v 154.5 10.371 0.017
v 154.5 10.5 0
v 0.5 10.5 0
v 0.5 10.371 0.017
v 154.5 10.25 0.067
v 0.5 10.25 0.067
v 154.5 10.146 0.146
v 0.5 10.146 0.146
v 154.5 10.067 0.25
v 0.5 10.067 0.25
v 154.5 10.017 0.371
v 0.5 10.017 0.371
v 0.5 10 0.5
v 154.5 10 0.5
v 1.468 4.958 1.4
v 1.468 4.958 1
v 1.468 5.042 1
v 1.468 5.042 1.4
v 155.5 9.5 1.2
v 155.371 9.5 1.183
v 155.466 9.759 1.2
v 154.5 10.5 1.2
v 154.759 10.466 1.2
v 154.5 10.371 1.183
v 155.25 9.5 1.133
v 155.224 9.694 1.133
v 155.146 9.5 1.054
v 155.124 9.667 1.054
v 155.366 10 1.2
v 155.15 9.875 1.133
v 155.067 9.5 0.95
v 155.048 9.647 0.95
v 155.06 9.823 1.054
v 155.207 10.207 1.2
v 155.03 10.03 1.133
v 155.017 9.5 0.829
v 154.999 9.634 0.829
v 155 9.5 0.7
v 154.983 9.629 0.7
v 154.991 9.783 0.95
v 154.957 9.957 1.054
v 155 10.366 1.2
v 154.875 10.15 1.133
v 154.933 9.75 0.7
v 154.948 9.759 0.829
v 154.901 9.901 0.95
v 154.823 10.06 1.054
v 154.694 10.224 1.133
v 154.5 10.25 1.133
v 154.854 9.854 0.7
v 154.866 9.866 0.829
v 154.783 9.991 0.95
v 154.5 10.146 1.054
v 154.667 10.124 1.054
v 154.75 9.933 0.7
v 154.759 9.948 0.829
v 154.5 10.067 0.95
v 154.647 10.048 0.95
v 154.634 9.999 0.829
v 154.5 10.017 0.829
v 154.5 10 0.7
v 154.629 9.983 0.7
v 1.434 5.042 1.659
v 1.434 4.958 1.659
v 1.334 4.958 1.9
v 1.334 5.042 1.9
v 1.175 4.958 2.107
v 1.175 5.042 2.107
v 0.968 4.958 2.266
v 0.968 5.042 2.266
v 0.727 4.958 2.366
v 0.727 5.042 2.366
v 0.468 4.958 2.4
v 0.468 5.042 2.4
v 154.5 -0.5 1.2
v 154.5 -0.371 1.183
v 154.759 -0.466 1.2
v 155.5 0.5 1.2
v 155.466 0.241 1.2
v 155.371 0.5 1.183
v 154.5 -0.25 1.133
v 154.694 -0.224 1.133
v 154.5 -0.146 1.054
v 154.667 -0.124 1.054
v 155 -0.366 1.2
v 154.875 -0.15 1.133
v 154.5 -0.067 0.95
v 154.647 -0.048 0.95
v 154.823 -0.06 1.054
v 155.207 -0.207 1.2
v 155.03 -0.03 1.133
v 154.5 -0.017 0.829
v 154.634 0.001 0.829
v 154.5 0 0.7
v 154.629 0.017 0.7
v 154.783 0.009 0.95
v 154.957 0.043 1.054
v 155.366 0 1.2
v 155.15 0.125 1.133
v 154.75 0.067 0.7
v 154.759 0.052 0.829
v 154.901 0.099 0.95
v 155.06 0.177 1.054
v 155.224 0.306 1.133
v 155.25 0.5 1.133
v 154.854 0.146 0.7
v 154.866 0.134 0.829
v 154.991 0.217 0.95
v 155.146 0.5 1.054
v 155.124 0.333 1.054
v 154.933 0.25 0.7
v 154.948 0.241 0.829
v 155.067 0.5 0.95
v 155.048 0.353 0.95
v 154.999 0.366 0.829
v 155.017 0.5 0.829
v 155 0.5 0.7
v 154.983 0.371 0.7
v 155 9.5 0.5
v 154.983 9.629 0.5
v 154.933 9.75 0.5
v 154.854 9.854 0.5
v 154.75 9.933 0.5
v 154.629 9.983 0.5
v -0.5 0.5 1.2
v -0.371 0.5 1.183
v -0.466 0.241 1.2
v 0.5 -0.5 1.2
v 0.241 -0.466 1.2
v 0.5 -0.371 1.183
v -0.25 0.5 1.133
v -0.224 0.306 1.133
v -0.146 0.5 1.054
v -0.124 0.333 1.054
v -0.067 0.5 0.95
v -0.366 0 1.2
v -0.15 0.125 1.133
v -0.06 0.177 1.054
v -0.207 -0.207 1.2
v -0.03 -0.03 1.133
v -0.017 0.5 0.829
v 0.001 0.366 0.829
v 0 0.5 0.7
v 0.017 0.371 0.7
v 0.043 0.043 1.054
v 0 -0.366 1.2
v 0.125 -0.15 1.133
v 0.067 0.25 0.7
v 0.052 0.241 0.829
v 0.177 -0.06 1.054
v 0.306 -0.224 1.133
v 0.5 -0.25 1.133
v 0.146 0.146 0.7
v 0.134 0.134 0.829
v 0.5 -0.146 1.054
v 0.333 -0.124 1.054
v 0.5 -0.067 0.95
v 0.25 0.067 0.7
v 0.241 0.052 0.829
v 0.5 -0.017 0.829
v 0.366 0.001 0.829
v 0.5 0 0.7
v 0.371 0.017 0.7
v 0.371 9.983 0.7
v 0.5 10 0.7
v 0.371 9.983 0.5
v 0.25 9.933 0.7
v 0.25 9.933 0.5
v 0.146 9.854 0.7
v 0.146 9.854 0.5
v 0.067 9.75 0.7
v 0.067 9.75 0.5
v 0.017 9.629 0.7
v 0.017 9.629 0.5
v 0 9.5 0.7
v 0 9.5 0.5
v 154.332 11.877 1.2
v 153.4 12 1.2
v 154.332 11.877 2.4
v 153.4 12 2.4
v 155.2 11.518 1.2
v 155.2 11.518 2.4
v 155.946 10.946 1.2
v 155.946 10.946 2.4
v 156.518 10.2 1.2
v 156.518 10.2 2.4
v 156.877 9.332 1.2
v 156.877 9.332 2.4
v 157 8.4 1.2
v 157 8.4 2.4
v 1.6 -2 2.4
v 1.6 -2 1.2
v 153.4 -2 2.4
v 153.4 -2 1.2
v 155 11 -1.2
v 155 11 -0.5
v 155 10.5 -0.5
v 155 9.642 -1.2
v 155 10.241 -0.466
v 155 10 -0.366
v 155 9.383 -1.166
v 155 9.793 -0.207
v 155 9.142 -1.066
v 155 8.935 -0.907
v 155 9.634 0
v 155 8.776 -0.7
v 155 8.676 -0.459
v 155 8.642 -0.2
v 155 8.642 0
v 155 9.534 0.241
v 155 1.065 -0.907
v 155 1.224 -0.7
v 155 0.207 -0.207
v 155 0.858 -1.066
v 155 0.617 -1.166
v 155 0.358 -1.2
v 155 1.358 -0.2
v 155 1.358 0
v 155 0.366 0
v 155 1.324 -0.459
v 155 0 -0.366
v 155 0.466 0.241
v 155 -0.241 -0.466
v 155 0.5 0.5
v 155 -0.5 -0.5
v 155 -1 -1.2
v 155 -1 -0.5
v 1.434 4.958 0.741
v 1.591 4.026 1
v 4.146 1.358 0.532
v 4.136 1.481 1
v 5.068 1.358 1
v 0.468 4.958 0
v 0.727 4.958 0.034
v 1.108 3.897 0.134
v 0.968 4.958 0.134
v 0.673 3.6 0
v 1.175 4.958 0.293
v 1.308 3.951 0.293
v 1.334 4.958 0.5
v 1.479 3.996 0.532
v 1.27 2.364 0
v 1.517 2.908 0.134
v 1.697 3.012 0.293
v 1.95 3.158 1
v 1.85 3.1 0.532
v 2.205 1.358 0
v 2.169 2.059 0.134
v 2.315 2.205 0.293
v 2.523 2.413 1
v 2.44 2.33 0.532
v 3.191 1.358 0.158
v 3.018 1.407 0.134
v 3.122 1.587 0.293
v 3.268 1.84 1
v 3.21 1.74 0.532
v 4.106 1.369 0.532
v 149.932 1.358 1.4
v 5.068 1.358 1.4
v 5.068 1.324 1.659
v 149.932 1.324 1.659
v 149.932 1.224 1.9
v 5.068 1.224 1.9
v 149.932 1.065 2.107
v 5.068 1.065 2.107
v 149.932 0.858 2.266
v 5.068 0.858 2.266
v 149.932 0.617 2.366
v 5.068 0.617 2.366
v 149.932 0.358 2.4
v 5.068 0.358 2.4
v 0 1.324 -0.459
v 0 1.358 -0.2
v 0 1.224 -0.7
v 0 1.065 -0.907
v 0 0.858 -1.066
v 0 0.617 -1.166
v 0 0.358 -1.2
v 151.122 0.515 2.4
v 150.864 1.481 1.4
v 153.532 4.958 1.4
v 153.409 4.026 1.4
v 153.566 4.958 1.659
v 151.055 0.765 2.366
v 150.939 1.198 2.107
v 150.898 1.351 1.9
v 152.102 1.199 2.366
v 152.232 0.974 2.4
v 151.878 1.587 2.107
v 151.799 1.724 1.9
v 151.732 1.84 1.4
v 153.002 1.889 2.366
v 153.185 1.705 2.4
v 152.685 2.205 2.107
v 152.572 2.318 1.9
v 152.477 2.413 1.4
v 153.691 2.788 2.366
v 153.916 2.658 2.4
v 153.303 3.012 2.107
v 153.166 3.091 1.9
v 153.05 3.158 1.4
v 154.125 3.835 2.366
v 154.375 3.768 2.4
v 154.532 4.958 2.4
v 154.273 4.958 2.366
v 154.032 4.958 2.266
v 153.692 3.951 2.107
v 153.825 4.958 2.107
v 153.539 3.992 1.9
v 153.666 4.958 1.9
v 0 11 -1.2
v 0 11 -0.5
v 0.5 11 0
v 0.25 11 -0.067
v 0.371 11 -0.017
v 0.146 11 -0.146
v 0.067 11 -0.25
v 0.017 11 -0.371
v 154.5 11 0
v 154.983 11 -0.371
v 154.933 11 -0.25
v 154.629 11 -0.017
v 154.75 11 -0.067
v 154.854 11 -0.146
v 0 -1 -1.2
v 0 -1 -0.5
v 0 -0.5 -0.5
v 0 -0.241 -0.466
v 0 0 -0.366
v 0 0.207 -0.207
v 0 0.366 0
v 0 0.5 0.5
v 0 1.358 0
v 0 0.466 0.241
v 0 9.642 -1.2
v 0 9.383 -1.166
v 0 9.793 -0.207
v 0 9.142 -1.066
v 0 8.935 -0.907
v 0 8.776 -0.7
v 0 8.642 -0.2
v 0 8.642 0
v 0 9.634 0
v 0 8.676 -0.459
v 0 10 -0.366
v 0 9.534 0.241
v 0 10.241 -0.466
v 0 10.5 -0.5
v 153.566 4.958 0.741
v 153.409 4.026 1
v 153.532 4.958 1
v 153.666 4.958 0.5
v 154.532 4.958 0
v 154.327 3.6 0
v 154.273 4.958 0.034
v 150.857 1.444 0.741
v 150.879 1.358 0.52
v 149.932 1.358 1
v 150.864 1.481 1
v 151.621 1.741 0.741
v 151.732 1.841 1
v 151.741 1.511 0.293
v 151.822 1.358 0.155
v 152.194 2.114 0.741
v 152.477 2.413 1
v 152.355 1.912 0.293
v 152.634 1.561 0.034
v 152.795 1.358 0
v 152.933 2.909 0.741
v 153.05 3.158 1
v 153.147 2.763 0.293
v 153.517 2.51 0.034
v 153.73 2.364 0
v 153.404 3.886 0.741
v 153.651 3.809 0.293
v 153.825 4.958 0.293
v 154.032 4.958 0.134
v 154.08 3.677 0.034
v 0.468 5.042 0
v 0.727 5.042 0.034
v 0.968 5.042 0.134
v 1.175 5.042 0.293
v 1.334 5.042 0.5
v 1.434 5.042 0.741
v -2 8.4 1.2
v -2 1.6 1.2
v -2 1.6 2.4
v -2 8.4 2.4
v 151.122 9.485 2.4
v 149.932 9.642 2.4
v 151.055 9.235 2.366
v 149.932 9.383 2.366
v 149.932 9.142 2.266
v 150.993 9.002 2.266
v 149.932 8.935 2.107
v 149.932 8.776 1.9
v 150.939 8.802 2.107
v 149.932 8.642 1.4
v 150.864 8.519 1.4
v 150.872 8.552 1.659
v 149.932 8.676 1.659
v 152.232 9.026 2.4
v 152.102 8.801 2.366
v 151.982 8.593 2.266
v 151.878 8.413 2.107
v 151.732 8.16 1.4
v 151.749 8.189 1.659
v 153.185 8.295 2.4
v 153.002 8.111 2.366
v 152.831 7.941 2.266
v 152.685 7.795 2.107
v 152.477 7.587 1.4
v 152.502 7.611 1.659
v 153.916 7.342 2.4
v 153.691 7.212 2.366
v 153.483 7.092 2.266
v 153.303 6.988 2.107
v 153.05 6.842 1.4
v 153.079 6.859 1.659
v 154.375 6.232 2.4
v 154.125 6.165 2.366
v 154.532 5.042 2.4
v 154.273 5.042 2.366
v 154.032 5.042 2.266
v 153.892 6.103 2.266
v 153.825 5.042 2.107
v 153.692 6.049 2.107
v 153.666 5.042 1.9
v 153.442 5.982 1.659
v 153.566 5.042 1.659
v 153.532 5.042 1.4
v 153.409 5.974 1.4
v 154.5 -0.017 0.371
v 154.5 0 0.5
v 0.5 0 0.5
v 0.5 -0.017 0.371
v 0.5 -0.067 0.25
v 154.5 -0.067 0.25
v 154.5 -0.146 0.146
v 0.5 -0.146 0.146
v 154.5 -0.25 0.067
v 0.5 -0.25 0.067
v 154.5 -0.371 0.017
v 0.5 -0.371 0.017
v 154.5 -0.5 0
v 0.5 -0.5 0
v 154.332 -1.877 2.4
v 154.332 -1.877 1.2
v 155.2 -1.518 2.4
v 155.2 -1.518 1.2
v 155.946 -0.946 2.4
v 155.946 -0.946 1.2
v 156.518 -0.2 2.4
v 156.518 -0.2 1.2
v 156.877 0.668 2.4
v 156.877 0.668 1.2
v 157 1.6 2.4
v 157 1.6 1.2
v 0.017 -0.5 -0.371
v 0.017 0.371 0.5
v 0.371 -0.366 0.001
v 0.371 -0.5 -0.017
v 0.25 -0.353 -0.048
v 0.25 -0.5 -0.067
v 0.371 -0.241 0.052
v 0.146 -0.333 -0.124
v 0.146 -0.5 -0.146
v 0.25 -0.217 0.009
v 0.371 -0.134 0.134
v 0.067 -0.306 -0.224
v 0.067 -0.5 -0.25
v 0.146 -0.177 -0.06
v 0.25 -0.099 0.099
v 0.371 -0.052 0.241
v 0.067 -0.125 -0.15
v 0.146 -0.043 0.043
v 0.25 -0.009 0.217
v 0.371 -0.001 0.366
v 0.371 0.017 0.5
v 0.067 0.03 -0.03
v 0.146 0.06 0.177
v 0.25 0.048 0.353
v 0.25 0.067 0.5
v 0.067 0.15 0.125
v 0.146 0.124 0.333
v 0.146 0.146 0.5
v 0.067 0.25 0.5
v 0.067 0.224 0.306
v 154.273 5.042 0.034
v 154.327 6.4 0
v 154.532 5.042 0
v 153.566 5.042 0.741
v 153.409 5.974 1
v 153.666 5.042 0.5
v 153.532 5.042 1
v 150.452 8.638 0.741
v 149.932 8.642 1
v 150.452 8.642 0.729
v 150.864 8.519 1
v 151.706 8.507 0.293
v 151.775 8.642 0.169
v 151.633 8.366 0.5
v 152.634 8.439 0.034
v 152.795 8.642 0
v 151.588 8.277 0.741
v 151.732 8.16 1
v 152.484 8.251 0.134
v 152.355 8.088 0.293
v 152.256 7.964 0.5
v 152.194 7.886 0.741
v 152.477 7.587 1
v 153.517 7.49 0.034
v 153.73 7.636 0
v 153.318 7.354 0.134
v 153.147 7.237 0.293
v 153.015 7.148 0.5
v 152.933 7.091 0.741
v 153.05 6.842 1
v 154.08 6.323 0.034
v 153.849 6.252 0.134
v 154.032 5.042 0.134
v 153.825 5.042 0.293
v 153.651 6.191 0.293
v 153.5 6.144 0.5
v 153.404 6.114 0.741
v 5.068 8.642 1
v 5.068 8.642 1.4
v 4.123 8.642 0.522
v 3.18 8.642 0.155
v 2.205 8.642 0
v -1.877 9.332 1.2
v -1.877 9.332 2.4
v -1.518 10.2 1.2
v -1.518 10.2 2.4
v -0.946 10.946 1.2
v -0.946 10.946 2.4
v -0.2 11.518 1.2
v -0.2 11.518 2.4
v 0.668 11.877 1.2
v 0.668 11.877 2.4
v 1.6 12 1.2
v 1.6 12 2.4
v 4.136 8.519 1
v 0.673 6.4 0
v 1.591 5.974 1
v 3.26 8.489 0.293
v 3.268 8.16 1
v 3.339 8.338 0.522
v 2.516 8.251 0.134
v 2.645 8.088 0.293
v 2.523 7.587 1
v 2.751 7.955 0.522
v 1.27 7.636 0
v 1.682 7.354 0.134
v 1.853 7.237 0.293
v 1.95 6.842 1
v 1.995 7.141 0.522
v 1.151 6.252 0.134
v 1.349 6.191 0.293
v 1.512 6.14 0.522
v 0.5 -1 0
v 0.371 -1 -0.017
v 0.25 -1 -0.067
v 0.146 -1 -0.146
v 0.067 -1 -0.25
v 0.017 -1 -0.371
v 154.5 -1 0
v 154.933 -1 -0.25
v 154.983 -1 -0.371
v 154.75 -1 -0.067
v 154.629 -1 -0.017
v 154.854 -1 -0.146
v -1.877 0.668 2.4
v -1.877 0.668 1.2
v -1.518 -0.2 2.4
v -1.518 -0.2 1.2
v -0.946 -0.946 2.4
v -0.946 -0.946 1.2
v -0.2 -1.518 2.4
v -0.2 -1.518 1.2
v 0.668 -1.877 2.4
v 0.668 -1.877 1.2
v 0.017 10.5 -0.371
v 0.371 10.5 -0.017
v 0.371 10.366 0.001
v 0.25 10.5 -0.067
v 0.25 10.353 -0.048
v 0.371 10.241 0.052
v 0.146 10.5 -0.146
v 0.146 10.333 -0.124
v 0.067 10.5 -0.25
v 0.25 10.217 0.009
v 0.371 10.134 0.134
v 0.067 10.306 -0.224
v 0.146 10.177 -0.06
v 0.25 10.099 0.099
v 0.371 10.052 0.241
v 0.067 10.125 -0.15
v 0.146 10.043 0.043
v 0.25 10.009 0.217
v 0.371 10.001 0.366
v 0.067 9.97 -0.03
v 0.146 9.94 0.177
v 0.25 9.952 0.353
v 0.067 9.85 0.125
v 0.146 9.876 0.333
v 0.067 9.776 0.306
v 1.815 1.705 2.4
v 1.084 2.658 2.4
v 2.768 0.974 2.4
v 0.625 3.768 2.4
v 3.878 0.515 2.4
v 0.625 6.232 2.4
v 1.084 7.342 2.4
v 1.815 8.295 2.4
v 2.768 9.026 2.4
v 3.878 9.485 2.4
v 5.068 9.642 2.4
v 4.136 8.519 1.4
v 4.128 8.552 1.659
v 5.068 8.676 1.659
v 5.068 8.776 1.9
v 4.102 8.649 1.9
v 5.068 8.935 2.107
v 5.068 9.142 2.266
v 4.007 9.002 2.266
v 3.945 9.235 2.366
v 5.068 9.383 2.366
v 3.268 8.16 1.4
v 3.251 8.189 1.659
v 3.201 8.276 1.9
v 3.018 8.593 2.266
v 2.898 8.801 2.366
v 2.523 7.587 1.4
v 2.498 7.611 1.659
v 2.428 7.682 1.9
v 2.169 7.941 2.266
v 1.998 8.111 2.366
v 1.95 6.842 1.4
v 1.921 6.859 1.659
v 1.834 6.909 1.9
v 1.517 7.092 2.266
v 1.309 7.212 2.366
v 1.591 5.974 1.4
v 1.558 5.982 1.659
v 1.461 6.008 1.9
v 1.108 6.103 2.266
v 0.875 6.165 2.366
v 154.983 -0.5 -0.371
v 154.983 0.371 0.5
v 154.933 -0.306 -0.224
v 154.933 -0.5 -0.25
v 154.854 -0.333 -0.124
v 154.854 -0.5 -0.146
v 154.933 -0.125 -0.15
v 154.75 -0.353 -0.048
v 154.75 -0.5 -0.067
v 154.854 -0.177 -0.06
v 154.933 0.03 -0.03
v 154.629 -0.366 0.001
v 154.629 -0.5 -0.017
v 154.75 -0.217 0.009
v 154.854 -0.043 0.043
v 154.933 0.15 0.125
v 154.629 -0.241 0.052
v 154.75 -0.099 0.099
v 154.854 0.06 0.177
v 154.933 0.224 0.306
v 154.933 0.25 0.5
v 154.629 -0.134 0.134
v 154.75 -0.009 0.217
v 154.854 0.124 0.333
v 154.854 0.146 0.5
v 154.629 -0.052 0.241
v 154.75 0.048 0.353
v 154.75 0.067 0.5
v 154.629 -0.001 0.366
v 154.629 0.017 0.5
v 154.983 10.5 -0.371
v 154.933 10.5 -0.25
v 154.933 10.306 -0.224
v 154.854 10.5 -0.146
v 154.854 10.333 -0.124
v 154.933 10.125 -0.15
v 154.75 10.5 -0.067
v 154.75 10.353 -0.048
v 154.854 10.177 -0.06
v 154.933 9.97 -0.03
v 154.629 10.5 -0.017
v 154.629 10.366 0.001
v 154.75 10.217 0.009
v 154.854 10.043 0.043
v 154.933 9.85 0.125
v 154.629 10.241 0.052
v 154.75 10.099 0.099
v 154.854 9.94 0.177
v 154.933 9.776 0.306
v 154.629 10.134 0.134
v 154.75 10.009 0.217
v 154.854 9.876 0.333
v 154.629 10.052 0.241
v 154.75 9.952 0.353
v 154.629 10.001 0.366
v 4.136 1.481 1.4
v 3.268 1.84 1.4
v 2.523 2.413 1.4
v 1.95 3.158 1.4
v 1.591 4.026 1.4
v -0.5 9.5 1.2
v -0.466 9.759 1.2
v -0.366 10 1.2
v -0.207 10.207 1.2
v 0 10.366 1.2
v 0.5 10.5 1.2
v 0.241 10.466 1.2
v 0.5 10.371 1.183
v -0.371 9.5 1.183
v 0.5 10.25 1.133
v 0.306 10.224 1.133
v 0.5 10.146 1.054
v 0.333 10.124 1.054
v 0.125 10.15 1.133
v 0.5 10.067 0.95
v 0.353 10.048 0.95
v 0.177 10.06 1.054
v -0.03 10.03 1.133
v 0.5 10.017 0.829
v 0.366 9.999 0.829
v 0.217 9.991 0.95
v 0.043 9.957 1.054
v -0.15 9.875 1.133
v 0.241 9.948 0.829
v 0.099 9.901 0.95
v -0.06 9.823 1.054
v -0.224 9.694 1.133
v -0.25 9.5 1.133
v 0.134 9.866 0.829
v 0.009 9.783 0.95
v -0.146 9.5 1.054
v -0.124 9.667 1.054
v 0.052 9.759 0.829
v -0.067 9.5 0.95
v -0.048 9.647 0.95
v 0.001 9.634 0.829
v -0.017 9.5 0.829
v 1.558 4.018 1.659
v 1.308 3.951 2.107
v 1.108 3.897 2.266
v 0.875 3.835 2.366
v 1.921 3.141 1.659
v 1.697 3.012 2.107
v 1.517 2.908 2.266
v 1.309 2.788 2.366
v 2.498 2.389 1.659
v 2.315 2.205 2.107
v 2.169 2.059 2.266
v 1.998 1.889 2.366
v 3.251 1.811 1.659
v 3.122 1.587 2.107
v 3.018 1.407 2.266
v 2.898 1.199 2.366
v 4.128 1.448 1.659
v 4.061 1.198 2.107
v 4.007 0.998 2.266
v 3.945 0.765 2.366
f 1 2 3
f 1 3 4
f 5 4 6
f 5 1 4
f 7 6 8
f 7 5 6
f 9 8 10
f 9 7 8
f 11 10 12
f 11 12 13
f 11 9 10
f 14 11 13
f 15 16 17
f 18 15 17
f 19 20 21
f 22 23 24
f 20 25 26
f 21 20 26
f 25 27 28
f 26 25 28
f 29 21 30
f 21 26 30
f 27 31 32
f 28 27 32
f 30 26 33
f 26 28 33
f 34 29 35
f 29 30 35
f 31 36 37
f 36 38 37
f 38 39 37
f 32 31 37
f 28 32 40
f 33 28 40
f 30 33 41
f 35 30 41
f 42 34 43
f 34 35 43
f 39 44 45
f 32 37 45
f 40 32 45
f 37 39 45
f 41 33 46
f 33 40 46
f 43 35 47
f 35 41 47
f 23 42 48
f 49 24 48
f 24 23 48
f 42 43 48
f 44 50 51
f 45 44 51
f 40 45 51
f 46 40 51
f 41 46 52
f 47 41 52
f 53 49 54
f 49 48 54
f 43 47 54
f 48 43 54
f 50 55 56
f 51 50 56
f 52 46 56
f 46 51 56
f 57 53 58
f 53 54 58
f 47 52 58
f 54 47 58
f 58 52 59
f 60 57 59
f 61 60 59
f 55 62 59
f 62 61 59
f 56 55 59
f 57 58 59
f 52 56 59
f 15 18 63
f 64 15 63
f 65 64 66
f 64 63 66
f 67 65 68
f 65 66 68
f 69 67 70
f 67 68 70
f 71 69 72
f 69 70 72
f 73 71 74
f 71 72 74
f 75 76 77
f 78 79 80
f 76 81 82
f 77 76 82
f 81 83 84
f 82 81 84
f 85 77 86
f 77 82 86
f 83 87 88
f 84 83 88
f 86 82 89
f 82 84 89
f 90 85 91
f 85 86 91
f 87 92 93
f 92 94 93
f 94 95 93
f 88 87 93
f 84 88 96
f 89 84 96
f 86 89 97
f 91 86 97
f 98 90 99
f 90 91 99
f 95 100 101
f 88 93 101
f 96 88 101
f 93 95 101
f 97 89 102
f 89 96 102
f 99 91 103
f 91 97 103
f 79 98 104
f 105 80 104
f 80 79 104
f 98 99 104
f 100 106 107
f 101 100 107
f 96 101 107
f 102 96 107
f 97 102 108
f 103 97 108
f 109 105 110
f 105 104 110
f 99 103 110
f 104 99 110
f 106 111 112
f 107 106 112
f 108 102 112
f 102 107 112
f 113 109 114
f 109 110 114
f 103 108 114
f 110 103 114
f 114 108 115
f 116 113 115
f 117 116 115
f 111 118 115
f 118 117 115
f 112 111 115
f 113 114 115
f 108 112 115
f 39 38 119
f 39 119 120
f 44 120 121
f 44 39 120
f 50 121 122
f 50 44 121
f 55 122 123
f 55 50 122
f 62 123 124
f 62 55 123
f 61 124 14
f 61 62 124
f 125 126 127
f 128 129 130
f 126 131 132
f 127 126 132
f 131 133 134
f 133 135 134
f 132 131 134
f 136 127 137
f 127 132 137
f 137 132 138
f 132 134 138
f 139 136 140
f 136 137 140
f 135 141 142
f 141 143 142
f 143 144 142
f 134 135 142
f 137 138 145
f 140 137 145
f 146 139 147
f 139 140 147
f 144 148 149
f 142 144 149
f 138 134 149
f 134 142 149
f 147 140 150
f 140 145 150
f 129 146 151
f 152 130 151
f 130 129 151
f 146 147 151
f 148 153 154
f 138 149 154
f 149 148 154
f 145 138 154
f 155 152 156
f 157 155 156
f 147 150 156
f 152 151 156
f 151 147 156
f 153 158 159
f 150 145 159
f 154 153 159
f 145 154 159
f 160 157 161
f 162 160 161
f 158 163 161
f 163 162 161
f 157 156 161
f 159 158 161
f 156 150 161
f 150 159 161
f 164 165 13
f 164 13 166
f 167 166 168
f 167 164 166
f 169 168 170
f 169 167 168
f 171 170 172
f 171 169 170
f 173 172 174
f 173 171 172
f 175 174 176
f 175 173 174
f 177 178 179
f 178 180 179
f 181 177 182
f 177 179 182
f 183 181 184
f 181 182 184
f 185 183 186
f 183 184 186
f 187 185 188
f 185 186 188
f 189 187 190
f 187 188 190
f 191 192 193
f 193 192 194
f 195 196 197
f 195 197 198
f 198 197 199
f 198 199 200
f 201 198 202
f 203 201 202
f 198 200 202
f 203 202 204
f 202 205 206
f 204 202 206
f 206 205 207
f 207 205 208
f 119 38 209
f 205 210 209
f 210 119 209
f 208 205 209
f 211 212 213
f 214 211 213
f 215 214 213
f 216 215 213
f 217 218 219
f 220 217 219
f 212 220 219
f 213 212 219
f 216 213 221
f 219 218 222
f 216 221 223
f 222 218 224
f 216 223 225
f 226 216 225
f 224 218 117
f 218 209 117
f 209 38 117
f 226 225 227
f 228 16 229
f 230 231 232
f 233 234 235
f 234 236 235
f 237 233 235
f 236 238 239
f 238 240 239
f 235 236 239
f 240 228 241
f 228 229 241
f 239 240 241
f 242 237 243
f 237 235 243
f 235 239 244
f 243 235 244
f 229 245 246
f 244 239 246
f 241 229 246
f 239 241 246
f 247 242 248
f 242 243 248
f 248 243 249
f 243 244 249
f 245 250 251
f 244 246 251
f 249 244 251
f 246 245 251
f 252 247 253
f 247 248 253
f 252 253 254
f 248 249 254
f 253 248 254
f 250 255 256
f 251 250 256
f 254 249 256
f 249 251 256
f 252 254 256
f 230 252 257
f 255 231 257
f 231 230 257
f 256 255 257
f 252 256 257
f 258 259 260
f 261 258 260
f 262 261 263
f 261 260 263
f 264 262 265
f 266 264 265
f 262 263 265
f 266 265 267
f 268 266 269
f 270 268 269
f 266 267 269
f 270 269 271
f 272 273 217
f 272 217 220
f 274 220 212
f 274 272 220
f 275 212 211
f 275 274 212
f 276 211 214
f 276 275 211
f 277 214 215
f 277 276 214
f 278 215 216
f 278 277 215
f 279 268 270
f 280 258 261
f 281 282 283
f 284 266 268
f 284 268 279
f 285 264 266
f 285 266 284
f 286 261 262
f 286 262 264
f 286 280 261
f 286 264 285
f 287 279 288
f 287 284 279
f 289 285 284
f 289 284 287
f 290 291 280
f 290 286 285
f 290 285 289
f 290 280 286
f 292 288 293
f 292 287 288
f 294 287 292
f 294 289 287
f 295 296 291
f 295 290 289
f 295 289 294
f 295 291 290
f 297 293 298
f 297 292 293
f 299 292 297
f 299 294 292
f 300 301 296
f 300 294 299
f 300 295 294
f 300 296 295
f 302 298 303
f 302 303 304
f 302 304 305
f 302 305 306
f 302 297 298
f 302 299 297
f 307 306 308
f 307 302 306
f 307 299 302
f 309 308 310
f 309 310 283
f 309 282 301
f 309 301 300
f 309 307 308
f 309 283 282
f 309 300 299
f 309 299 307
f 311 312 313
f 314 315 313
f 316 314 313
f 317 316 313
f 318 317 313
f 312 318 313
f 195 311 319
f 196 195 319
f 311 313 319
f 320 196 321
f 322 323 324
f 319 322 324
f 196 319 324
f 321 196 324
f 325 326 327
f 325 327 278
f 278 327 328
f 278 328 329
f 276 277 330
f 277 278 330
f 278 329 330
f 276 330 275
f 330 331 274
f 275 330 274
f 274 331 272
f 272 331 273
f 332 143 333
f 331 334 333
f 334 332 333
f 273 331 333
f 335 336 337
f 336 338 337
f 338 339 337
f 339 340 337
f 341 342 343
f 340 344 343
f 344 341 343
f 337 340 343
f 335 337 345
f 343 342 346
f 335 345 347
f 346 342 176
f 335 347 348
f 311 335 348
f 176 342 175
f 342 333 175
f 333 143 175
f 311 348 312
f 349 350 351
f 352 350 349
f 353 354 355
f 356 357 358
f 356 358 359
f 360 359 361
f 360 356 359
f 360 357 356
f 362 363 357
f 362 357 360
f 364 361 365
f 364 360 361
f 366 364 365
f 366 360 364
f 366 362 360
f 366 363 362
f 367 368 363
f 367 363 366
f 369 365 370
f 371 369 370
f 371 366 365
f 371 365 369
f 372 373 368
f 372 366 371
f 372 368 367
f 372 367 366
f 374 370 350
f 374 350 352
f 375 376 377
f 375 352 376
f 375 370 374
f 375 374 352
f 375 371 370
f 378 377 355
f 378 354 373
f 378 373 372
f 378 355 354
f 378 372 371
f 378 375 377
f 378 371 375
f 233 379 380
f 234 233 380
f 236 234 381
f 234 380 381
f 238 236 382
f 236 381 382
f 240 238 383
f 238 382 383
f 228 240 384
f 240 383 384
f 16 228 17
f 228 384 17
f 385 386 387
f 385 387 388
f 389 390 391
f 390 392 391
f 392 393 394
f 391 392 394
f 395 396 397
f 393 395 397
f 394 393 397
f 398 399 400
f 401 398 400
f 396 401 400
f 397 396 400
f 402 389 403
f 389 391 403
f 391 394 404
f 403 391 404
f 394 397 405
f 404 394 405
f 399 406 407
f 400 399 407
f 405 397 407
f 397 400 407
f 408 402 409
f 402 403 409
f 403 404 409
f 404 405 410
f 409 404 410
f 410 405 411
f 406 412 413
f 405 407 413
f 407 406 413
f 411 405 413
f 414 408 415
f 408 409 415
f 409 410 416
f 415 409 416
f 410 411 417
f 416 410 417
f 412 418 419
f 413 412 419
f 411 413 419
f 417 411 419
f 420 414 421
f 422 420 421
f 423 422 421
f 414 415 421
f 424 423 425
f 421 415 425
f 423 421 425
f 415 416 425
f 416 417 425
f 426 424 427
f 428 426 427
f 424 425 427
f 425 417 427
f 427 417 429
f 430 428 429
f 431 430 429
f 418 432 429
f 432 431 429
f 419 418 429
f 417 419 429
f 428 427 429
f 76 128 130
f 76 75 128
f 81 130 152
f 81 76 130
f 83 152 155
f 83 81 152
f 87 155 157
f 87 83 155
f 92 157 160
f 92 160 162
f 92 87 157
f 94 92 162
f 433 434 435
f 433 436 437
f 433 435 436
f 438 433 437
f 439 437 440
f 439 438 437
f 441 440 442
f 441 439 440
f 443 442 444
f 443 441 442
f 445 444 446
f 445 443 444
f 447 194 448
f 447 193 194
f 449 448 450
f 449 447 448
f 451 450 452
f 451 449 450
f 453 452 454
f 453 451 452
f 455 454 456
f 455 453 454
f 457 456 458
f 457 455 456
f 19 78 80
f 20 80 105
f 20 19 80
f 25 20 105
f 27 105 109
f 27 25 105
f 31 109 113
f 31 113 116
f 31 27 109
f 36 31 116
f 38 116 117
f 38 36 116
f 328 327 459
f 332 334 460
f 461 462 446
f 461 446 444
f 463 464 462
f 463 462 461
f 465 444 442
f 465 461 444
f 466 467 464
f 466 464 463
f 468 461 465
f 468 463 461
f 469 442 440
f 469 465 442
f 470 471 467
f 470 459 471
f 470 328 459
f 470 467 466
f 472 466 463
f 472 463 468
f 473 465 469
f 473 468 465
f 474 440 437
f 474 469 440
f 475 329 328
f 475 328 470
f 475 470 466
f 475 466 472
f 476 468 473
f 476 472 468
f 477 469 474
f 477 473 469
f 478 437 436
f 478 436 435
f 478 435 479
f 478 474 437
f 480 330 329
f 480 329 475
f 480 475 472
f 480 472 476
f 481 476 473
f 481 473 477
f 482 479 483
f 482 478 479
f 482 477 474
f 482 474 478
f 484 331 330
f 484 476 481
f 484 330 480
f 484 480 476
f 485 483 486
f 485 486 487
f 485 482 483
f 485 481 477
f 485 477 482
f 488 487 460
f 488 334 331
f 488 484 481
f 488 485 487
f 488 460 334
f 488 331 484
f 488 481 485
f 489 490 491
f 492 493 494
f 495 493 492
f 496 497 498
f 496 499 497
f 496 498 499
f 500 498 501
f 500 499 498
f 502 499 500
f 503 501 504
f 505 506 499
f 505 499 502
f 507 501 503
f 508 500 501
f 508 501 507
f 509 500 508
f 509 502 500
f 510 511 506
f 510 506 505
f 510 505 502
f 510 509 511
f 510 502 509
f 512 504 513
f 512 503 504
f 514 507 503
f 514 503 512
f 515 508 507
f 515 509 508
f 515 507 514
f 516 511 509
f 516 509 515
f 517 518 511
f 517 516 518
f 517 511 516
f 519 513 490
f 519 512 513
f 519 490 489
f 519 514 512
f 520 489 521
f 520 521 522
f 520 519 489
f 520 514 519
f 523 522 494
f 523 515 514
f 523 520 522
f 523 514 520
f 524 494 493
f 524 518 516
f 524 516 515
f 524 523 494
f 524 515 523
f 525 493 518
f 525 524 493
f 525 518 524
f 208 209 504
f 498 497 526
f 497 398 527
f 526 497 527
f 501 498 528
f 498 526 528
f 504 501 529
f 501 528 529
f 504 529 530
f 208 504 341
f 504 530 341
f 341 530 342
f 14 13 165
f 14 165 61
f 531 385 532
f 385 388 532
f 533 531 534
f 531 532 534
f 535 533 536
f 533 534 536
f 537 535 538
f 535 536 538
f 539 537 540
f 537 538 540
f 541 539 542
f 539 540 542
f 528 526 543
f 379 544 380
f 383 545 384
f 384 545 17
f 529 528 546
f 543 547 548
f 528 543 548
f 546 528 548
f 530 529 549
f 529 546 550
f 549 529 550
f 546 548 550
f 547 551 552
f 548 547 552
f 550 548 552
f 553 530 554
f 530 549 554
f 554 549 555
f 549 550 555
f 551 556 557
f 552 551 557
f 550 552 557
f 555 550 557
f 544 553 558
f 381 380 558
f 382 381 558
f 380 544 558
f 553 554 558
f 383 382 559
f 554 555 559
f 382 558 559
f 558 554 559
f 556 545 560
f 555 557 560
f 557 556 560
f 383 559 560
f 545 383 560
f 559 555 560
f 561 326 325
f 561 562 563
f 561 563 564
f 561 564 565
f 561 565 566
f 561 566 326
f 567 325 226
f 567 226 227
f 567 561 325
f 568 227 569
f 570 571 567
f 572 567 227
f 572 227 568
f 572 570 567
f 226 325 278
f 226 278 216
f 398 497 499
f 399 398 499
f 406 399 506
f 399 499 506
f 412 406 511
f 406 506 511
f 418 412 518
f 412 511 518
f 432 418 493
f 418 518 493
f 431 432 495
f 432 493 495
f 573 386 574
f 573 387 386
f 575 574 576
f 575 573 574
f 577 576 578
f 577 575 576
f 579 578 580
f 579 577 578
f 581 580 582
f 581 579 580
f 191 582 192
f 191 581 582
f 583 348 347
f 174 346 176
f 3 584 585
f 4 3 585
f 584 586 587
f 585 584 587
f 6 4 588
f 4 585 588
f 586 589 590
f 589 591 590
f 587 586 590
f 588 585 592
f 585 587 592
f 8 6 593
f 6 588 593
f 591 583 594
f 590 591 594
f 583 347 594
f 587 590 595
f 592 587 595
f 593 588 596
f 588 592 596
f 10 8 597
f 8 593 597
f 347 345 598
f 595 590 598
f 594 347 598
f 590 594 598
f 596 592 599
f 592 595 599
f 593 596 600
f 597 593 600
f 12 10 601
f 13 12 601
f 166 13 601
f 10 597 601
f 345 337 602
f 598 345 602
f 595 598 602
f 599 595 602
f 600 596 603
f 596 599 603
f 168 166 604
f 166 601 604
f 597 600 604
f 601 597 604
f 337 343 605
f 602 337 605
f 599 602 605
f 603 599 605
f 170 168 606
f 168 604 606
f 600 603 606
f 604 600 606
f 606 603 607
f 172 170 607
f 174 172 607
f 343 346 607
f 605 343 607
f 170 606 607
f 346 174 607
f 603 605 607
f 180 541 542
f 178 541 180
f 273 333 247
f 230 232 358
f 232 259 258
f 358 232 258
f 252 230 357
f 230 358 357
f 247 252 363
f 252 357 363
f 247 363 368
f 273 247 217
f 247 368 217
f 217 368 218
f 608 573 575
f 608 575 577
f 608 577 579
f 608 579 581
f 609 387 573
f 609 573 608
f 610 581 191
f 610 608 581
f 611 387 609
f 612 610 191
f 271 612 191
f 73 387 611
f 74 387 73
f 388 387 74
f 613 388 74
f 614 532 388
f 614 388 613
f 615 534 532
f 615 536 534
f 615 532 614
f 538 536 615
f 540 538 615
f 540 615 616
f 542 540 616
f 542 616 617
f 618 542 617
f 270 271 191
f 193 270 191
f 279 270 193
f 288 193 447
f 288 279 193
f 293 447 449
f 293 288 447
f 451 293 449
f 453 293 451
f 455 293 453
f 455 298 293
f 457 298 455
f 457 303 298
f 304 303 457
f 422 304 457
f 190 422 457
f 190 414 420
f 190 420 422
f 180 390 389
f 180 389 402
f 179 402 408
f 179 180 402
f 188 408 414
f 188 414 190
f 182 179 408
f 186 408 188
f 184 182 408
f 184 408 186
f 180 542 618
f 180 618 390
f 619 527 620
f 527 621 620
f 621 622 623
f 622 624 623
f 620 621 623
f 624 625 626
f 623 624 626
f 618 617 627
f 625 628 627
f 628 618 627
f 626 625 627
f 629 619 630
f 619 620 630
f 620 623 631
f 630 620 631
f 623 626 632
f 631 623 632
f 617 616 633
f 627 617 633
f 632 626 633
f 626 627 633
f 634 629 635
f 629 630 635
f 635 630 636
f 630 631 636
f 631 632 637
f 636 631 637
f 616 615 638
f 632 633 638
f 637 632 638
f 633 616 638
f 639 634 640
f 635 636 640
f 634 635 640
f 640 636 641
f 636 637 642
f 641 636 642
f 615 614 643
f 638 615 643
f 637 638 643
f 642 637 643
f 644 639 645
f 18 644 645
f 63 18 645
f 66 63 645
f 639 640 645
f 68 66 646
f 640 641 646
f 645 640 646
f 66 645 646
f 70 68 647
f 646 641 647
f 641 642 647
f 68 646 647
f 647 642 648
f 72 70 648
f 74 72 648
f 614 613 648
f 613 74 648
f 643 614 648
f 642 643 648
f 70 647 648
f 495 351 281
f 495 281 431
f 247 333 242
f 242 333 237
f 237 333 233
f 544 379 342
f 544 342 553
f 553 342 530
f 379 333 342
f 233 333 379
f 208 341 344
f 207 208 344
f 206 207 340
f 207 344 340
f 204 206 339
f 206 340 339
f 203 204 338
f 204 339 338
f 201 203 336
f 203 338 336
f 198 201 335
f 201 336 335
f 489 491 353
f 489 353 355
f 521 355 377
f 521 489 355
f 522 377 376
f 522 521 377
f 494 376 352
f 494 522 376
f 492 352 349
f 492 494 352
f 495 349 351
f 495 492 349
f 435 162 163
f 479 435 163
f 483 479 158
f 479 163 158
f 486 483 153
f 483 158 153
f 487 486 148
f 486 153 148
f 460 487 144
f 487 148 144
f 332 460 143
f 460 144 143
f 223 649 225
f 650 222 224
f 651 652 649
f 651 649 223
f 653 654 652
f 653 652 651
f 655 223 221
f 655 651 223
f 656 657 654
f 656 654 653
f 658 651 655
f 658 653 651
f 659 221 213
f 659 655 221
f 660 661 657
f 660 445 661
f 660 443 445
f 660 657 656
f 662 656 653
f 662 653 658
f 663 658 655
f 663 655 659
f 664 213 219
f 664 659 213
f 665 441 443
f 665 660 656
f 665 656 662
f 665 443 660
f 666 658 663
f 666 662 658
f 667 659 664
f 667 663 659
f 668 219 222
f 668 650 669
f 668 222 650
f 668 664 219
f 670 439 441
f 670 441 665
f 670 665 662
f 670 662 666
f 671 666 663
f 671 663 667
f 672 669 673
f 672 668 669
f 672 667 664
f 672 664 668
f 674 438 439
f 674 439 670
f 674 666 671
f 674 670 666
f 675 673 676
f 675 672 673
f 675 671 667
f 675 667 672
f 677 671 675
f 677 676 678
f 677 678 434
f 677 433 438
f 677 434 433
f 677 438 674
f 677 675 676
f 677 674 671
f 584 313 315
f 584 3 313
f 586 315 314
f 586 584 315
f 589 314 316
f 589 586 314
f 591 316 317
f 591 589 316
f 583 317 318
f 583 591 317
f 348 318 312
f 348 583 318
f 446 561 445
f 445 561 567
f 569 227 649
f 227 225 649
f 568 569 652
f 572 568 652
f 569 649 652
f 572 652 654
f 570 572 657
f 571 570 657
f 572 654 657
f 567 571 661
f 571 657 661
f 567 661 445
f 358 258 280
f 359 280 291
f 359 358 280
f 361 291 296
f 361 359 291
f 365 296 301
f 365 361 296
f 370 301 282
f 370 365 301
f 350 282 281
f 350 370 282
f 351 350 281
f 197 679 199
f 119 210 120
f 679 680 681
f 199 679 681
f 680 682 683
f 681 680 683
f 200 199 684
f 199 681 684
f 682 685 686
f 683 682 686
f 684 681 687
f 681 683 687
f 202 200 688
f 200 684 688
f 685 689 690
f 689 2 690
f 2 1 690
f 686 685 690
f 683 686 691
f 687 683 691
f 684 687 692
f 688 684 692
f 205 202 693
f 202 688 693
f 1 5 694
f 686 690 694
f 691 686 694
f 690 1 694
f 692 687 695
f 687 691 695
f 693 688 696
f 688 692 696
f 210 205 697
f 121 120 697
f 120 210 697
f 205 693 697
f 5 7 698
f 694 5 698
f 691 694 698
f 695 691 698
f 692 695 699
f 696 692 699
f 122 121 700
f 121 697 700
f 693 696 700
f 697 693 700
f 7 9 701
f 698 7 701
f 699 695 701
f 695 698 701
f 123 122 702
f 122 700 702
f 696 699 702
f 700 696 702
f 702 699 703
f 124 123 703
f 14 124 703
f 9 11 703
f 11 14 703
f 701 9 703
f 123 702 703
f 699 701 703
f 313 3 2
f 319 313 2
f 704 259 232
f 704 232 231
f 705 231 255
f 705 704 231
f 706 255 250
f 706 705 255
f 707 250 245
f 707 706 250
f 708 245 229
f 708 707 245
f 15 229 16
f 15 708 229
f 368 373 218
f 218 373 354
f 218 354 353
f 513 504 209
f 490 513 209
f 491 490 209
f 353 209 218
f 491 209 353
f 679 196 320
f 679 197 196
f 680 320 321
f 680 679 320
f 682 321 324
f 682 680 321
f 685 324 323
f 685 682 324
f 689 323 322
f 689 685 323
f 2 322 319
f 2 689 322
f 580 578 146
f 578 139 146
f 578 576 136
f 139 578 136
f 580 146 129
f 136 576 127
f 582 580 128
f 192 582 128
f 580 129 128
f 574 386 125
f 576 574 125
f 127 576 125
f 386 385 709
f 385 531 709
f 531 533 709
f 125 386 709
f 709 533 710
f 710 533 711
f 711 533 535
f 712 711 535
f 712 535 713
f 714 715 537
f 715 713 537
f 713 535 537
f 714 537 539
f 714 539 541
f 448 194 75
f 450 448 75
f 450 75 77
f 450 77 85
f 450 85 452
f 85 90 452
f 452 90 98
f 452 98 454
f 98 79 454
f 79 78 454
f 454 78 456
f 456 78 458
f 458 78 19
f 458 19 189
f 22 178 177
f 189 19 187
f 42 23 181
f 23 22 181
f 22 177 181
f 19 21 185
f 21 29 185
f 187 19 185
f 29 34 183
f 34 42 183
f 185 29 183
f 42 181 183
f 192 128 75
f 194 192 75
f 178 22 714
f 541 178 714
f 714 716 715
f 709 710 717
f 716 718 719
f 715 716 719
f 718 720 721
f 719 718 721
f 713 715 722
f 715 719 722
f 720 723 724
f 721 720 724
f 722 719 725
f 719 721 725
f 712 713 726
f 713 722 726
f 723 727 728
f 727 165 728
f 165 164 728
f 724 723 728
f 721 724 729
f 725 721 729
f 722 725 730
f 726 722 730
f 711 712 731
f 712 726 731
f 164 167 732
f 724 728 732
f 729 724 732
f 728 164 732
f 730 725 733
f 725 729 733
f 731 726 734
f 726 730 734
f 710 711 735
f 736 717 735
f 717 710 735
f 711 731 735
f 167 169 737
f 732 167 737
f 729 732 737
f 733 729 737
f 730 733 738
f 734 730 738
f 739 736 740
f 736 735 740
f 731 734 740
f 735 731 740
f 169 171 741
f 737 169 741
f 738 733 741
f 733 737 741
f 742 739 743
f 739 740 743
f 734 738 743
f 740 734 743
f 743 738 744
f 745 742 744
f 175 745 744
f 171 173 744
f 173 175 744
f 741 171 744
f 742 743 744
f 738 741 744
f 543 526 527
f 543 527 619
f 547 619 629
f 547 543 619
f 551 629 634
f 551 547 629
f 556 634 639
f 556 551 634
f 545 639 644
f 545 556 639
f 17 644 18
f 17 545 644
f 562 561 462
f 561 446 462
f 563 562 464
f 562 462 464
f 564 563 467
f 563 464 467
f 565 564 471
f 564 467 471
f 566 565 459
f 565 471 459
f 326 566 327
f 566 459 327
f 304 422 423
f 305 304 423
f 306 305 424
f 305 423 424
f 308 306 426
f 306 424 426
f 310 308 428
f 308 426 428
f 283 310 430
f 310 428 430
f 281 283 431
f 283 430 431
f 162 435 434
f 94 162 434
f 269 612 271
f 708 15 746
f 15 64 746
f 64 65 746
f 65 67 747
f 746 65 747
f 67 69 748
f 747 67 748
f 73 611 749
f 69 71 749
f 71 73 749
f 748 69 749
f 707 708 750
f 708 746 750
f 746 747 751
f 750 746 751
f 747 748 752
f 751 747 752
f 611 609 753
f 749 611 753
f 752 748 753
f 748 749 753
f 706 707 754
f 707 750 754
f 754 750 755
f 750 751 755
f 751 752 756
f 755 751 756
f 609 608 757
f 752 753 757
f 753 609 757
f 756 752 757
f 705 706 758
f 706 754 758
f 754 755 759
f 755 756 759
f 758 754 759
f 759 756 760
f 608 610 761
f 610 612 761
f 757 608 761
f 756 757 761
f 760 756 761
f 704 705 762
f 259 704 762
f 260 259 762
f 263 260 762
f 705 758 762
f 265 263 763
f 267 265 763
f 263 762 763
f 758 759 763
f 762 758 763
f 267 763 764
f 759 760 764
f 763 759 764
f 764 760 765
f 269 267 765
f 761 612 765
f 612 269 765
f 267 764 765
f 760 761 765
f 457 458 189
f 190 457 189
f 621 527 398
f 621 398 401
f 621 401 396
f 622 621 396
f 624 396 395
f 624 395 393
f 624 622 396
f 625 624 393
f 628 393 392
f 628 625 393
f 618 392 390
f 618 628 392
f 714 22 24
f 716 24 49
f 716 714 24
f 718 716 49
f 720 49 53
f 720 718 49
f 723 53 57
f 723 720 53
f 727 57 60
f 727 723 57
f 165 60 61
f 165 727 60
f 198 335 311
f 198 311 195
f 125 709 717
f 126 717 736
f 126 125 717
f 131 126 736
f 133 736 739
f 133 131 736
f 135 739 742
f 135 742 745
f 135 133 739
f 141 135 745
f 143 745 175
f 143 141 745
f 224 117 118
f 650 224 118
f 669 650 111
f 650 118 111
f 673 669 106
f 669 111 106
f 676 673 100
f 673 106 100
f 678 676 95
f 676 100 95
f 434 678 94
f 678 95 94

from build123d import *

# Parameters (mm, degrees)
F0_W         = 155
F0_H         = 10
F0_W_2       = 152.0637926605
F0_H_2       = 7.2836262298
F1_DEPTH     = 1.2
F2_W         = 159
F2_H         = 14
F2_W_2       = 155
F2_H_2       = 10
F2_W_3       = 152.0637926605
F2_H_3       = 7.2836262298
F3_DEPTH     = 1.2
F4_W         = 155
F4_H         = 1
F5_DEPTH     = 1.2
F6_R         = 3.6
F7_T1_DEPTH  = 160
F7_T3_DEPTH  = 0.0836262298
F7_T5_DEPTH  = 144.8637926605
F7_T10_ANGLE = 129.8047192326
F7_T13_ANGLE = 90
F7_T17_ANGLE = 129.8047192326
F7_T22_ANGLE = 129.8047192326
F7_T25_ANGLE = 90
F7_T27_ANGLE = 90
F7_T29_ANGLE = 90
F7_T33_ANGLE = 129.8047192326
F8_F1_R      = 0.5
F8_F2_R      = 0.5
F8_F3_R      = 0.5


# Not quite as in the source:
# - a fillet or chamfer that OpenCascade refuses, or shapes differently, is made with other operations: its cross-section is extruded or revolved along the edge and cut away or added


with BuildPart() as f1:
    # F0 (on Top) → F1 (new body)
    with BuildSketch(Plane.XY):
        with Locations((77.5, 5)):
            Rectangle(F0_W, F0_H)
        with Locations((77.5, 5)):
            Rectangle(F0_W_2, F0_H_2, mode=Mode.SUBTRACT)
    extrude(amount=F1_DEPTH)

    # F2 (on face) → F3 (join)
    with BuildSketch(Plane.XY.offset(1.2)):
        with Locations((77.5, 5)):
            Rectangle(F2_W, F2_H)
        with Locations((77.5, 5)):
            Rectangle(F2_W_2, F2_H_2, mode=Mode.SUBTRACT)
        with Locations((77.5, 5)):
            Rectangle(F2_W_2, F2_H_2)
        with Locations((77.5, 5)):
            Rectangle(F2_W_3, F2_H_3, mode=Mode.SUBTRACT)
    extrude(amount=F3_DEPTH)

    # F4 (on face) → F5 (join)
    with BuildSketch(Plane(origin=(0, 0, 0), x_dir=(1, 0, 0), z_dir=(0, 0, -1))):
        with Locations((77.5, 0.5)):
            Rectangle(F4_W, F4_H)
        Polygon((155, -1.3581868851), (155, 0), (0, 0), (0, -1.3581868851), (1.4681036697, -1.3581868851), (153.5318963303, -1.3581868851), align=None)
        Polygon((155, -10), (155, -8.6418131149), (153.5318963303, -8.6418131149), (1.4681036697, -8.6418131149), (0, -8.6418131149), (0, -10), align=None)
        with Locations((77.5, -10.5)):
            Rectangle(F4_W, F4_H)
    extrude(amount=F5_DEPTH)

    # F6
    f6_edges = [f1.edges().sort_by_distance(p)[0] for p in [
        (1.468104, 1.358187, 1.2),
        (1.468104, 8.641813, 1.2),
        (153.531896, 1.358187, 1.2),
        (153.531896, 8.641813, 1.2),
        (157, -2, 1.8),
        (157, 12, 1.8),
        (-2, 12, 1.8),
        (-2, -2, 1.8),
    ]]
    fillet(f6_edges, radius=F6_R)

    # F7: fillet of radius 1 on 16 edges, made by hand

    # F7_s2 → F7_t1 (cut)
    with BuildSketch(Plane.YZ.offset(-2.5)):
        with BuildLine():
            ThreePointArc((1.3581868851, -0.2), (1.0652936663, -0.9071067812), (0.3581868851, -1.2))
            Line((0.3581868851, -1.2), (1.3581868851, -1.2))
            Line((1.3581868851, -1.2), (1.3581868851, -0.2))
        make_face()
        with BuildLine():
            ThreePointArc((8.6418131149, -0.2), (8.9347063337, -0.9071067812), (9.6418131149, -1.2))
            Line((9.6418131149, -1.2), (8.6418131149, -1.2))
            Line((8.6418131149, -1.2), (8.6418131149, -0.2))
        make_face()
    extrude(amount=F7_T1_DEPTH, mode=Mode.SUBTRACT)

    # F7_s4 → F7_t3 (cut)
    with BuildSketch(Plane.XZ.offset(-5.0418131149)):
        with BuildLine():
            ThreePointArc((0.4681036697, 0), (1.1752104509, 0.2928932188), (1.4681036697, 1))
            Line((1.4681036697, 1), (1.4681036697, 0))
            Line((1.4681036697, 0), (0.4681036697, 0))
        make_face()
        with BuildLine():
            ThreePointArc((1.4681036697, 1.4), (1.1752104509, 2.1071067812), (0.4681036697, 2.4))
            Line((0.4681036697, 2.4), (1.4681036697, 2.4))
            Line((1.4681036697, 2.4), (1.4681036697, 1.4))
        make_face()
        with BuildLine():
            ThreePointArc((154.5318963303, 2.4), (153.8247895491, 2.1071067812), (153.5318963303, 1.4))
            Line((153.5318963303, 1.4), (153.5318963303, 2.4))
            Line((153.5318963303, 2.4), (154.5318963303, 2.4))
        make_face()
        with BuildLine():
            ThreePointArc((154.5318963303, 0), (153.8247895491, 0.2928932188), (153.5318963303, 1))
            Line((153.5318963303, 1), (153.5318963303, 0))
            Line((153.5318963303, 0), (154.5318963303, 0))
        make_face()
    extrude(amount=F7_T3_DEPTH, mode=Mode.SUBTRACT)

    # F7_s6 → F7_t5 (cut)
    with BuildSketch(Plane.YZ.offset(5.0681036697)):
        with BuildLine():
            ThreePointArc((1.3581868851, 1.4), (1.0652936663, 2.1071067812), (0.3581868851, 2.4))
            Line((0.3581868851, 2.4), (1.3581868851, 2.4))
            Line((1.3581868851, 2.4), (1.3581868851, 1.4))
        make_face()
        with BuildLine():
            ThreePointArc((8.6418131149, 1.4), (8.9347063337, 2.1071067812), (9.6418131149, 2.4))
            Line((9.6418131149, 2.4), (8.6418131149, 2.4))
            Line((8.6418131149, 2.4), (8.6418131149, 1.4))
        make_face()
    extrude(amount=F7_T5_DEPTH, mode=Mode.SUBTRACT)


with BuildPart() as f7_tool8:
    # F7_s9 → F7_t10 (revolve)
    with BuildSketch(Plane(origin=(0.5115194158, -0.4262532935, 0), x_dir=(0, 0, 1), z_dir=(0.7682307976, -0.6401729779, 0))):
        with BuildLine():
            ThreePointArc((0, -11.7177391291), (0.2928932188, -11.0106323479), (1, -10.7177391291))
            Line((1, -10.7177391291), (0, -10.7177391291))
            Line((0, -10.7177391291), (0, -11.7177391291))
        make_face()
    revolve(axis=Axis((5.0681036697, 5.0418131149, 0), (0, 0, 1)), revolution_arc=F7_T10_ANGLE)

    split(bisect_by=Plane.XZ.offset(-8.6418131149), keep=Keep.TOP)


with BuildPart() as f1_1:
    add(f1.part)

    # F7_t7: cut F7_tool8
    add(f7_tool8.part, mode=Mode.SUBTRACT)

    # F7_s12 → F7_t13 (revolve, cut)
    with BuildSketch(Plane.YZ.offset(5.0681036697)):
        with BuildLine():
            ThreePointArc((8.6418131149, 1.4), (8.9347063337, 2.1071067812), (9.6418131149, 2.4))
            Line((9.6418131149, 2.4), (8.6418131149, 2.4))
            Line((8.6418131149, 2.4), (8.6418131149, 1.4))
        make_face()
    revolve(axis=Axis((5.0681036697, 5.0418131149, 2.4), (0, 0, 1)), revolution_arc=F7_T13_ANGLE, mode=Mode.SUBTRACT)


with BuildPart() as f7_tool15:
    # F7_s16 → F7_t17 (revolve)
    with BuildSketch(Plane(origin=(90.9661571375, 75.8028393036, 0), x_dir=(0, 0, 1), z_dir=(-0.7682307976, -0.6401729779, 0))):
        with BuildLine():
            ThreePointArc((0, -87.5090724404), (0.2928932188, -88.2161792216), (1, -88.5090724404))
            Line((1, -88.5090724404), (0, -88.5090724404))
            Line((0, -88.5090724404), (0, -87.5090724404))
        make_face()
    revolve(axis=Axis((149.9318963303, 5.0418131149, 0), (0, 0, -1)), revolution_arc=F7_T17_ANGLE)

    split(bisect_by=Plane.XZ.offset(-8.6418131149), keep=Keep.TOP)


with BuildPart() as f1_2:
    add(f1_1.part)

    # F7_t14: cut F7_tool15
    add(f7_tool15.part, mode=Mode.SUBTRACT)


with BuildPart() as f7_tool20:
    # F7_s21 → F7_t22 (revolve)
    with BuildSketch(Plane.XZ.offset(-4.9581868851)):
        with BuildLine():
            ThreePointArc((0.4681036697, 0), (1.1752104509, 0.2928932188), (1.4681036697, 1))
            Line((1.4681036697, 1), (1.4681036697, 0))
            Line((1.4681036697, 0), (0.4681036697, 0))
        make_face()
    revolve(axis=Axis((5.0681036697, 4.9581868851, 0), (0, 0, 1)), revolution_arc=F7_T22_ANGLE)

    split(bisect_by=Plane.XZ.offset(-1.3581868851), keep=Keep.BOTTOM)


with BuildPart() as f1_3:
    add(f1_2.part)

    # F7_t19: cut F7_tool20
    add(f7_tool20.part, mode=Mode.SUBTRACT)

    # F7_s24 → F7_t25 (revolve, cut)
    with BuildSketch(Plane.XZ.offset(-4.9581868851)):
        with BuildLine():
            ThreePointArc((1.4681036697, 1.4), (1.1752104509, 2.1071067812), (0.4681036697, 2.4))
            Line((0.4681036697, 2.4), (1.4681036697, 2.4))
            Line((1.4681036697, 2.4), (1.4681036697, 1.4))
        make_face()
    revolve(axis=Axis((5.0681036697, 4.9581868851, 2.4), (0, 0, 1)), revolution_arc=F7_T25_ANGLE, mode=Mode.SUBTRACT)

    # F7_s26 → F7_t27 (revolve, cut)
    with BuildSketch(Plane.YZ.offset(149.9318963303)):
        with BuildLine():
            ThreePointArc((9.6418131149, 2.4), (8.9347063337, 2.1071067812), (8.6418131149, 1.4))
            Line((8.6418131149, 1.4), (8.6418131149, 2.4))
            Line((8.6418131149, 2.4), (9.6418131149, 2.4))
        make_face()
    revolve(axis=Axis((149.9318963303, 5.0418131149, 2.4), (0, 0, -1)), revolution_arc=F7_T27_ANGLE, mode=Mode.SUBTRACT)

    # F7_s28 → F7_t29 (revolve, cut)
    with BuildSketch(Plane.YZ.offset(149.9318963303)):
        with BuildLine():
            ThreePointArc((0.3581868851, 2.4), (1.0652936663, 2.1071067812), (1.3581868851, 1.4))
            Line((1.3581868851, 1.4), (1.3581868851, 2.4))
            Line((1.3581868851, 2.4), (0.3581868851, 2.4))
        make_face()
    revolve(axis=Axis((149.9318963303, 4.9581868851, 2.4), (0, 0, 1)), revolution_arc=F7_T29_ANGLE, mode=Mode.SUBTRACT)


with BuildPart() as f7_tool31:
    # F7_s32 → F7_t33 (revolve)
    with BuildSketch(Plane(origin=(86.0481511635, -71.7046248877, 0), x_dir=(0, 0, 1), z_dir=(-0.7682307976, 0.6401729779, 0))):
        with BuildLine():
            ThreePointArc((1, 96.1913804165), (0.2928932188, 95.8984871977), (0, 95.1913804165))
            Line((0, 95.1913804165), (0, 96.1913804165))
            Line((0, 96.1913804165), (1, 96.1913804165))
        make_face()
    revolve(axis=Axis((149.9318963303, 4.9581868851, 0), (0, 0, 1)), revolution_arc=F7_T33_ANGLE)

    split(bisect_by=Plane.XZ.offset(-1.3581868851), keep=Keep.BOTTOM)


with BuildPart() as f1_4:
    add(f1_3.part)

    # F7_t30: cut F7_tool31
    add(f7_tool31.part, mode=Mode.SUBTRACT)

    # F8: fillet of radius 0.5 on 10 edges, made by hand

    # F8_f1
    f8_f1_edges = [f1_4.edges().sort_by_distance(p)[0] for p in [
        (77.5, 0, 0),
        (77.5, 10, 0),
    ]]
    fillet(f8_f1_edges, radius=F8_F1_R)

    # F8_f2
    f8_f2_edges = [f1_4.edges().sort_by_distance(p)[0] for p in [
        (0, 0, 0.85),
        (155, 0, 0.85),
        (155, 10, 0.85),
        (0, 10, 0.85),
        (0, 10.1464466094, 0.1464466094),
        (155, 10.1464466094, 0.1464466094),
        (155, -0.1464466094, 0.1464466094),
        (0, -0.1464466094, 0.1464466094),
    ]]
    fillet(f8_f2_edges, radius=F8_F2_R)

    # F8_f3
    f8_f3_edges = [f1_4.edges().sort_by_distance(p)[0] for p in [
        (77.5, 0, 1.2),
        (77.5, 10, 1.2),
        (155, 5, 1.2),
        (0, 5, 1.2),
        (0.1464466094, 9.8535533906, 1.2),
        (0.1464466094, 0.1464466094, 1.2),
        (154.8535533906, 0.1464466094, 1.2),
        (154.8535533906, 9.8535533906, 1.2),
    ]]
    fillet(f8_f3_edges, radius=F8_F3_R)


solid = f1_4.part
